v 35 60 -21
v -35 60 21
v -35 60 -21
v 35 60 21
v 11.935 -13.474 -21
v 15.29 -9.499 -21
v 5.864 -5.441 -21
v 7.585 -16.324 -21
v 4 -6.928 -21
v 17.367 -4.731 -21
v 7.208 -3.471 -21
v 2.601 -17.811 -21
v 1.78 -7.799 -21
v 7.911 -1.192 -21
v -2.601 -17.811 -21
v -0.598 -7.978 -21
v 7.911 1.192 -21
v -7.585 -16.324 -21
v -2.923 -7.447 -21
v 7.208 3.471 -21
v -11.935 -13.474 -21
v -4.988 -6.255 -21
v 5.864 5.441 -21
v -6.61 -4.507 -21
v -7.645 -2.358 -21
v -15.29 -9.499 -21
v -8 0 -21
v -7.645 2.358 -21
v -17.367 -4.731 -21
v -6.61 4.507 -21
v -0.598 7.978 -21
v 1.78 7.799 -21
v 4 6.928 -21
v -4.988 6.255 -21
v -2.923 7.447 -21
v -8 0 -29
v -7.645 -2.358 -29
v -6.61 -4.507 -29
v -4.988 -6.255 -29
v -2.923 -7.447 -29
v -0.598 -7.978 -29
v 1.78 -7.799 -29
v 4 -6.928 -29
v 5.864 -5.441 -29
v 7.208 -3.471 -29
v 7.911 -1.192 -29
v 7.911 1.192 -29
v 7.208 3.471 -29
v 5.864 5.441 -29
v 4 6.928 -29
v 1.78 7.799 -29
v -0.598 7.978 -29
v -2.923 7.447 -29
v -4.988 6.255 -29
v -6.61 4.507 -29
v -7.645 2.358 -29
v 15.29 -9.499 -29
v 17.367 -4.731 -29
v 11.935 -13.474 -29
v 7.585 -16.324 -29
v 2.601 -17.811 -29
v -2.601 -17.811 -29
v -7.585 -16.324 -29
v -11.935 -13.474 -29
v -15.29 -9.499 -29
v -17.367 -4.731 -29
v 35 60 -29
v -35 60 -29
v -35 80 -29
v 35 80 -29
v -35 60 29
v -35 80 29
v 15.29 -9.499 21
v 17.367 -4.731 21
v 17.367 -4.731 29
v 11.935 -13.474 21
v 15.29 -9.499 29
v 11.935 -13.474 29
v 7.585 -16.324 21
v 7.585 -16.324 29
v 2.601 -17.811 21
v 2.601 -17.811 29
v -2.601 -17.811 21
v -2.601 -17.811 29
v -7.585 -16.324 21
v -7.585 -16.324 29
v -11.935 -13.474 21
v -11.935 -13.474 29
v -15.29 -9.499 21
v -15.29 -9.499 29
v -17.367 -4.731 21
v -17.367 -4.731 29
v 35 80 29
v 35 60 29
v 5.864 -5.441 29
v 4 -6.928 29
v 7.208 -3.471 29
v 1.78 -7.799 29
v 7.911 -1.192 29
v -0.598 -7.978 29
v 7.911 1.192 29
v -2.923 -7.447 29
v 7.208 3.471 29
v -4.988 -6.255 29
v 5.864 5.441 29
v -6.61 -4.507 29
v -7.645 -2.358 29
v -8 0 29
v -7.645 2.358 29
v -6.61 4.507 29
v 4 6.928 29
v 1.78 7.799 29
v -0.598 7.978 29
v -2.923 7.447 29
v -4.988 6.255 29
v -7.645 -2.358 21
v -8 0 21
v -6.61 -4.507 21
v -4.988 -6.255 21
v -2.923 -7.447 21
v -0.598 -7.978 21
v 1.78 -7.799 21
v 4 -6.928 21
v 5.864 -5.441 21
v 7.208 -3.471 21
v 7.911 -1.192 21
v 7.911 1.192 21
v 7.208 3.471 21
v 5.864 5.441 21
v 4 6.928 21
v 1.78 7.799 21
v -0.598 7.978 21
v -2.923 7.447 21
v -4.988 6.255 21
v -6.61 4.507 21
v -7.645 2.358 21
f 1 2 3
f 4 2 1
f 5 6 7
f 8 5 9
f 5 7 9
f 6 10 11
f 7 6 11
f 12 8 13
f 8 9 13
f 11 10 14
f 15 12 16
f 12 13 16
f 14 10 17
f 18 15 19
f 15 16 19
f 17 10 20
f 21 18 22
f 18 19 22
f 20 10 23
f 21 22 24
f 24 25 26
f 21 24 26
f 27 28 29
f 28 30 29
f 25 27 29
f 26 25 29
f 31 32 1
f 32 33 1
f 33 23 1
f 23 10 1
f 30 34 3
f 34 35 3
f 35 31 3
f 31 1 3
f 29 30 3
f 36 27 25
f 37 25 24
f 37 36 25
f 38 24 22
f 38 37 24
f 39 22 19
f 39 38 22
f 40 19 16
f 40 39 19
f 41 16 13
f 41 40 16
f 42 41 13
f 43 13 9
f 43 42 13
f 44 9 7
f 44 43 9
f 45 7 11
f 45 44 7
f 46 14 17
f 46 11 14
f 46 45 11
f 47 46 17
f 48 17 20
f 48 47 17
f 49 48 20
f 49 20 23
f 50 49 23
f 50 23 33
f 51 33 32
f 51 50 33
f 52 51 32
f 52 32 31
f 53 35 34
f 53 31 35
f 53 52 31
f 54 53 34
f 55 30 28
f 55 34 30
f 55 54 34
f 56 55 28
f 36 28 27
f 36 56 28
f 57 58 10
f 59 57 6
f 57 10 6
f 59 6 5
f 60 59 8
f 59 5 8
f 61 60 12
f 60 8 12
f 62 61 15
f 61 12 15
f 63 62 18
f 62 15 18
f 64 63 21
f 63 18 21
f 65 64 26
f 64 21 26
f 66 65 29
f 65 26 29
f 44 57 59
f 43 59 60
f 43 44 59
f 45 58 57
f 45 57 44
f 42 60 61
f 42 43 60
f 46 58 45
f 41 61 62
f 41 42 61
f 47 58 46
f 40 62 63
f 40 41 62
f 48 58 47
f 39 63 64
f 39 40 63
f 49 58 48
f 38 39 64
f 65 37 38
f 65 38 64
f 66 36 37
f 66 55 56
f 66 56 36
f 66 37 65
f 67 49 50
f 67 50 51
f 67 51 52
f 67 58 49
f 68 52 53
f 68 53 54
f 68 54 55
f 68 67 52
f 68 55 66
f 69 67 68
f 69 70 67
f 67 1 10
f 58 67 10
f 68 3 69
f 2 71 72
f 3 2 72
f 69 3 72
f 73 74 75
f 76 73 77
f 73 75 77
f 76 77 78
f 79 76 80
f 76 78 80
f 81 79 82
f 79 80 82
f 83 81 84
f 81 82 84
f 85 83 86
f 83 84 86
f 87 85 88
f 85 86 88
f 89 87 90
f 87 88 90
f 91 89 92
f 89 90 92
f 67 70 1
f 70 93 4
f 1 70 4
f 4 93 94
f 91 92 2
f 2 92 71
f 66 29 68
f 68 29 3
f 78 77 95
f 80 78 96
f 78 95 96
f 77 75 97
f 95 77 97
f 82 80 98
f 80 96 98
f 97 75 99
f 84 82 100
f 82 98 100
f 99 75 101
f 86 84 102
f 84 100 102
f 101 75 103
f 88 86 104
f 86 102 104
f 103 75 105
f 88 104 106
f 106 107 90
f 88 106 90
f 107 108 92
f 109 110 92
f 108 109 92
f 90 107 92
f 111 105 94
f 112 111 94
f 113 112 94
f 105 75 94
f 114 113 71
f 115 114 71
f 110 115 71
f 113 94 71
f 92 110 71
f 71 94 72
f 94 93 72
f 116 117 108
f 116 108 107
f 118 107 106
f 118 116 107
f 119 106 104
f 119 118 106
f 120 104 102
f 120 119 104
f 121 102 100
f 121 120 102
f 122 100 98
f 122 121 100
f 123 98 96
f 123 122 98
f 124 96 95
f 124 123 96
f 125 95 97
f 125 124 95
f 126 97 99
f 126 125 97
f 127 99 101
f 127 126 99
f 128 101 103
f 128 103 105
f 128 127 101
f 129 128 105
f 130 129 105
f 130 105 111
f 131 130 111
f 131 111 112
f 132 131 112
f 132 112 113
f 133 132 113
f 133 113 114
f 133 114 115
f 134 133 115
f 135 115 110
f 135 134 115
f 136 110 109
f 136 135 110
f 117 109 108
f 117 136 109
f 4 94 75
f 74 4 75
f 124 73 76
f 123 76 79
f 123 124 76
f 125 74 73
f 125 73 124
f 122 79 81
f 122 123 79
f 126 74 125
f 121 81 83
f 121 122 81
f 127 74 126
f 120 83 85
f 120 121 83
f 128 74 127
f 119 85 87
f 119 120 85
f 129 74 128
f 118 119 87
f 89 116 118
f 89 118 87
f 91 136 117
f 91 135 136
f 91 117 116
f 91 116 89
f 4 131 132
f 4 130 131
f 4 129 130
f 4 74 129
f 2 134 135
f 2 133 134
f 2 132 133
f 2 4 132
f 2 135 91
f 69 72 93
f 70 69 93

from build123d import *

# Parameters (mm, degrees)
SKETCH_1_R          = 8
EXTRUDE_1_DEPTH     = 29
CUT_EXTRUDE_1_DEPTH = 21


with BuildPart() as part:
    # 草图1 → 凸台-拉伸1 (new, symmetric)
    with BuildSketch(Plane.XY):
        with BuildLine():
            Line((35, 60), (17.367283762, -4.730856402))
            ThreePointArc((17.367283762, -4.730856402), (0, -18.000098543), (-17.367283762, -4.730856402))
            Line((-17.367283762, -4.730856402), (-35, 60))
            Line((-35, 60), (-35, 80))
            Line((-35, 80), (35, 80))
            Line((35, 80), (35, 60))
        make_face()
        with Locations(Location((0, 0, 0), (0, 0, 180))):
            Circle(SKETCH_1_R, mode=Mode.SUBTRACT)
    extrude(amount=EXTRUDE_1_DEPTH, both=True)

    # 草图2 → 切除-拉伸1 (cut, symmetric)
    with BuildSketch(Plane.XY):
        with BuildLine():
            Line((-35, 60), (35, 60))
            Line((35, 60), (17.367283762, -4.730856402))
            ThreePointArc((17.367283762, -4.730856402), (0, -18.000098543), (-17.367283762, -4.730856402))
            Line((-17.367283762, -4.730856402), (-35, 60))
        make_face()
    extrude(amount=CUT_EXTRUDE_1_DEPTH, both=True, mode=Mode.SUBTRACT)


solid = part.part
